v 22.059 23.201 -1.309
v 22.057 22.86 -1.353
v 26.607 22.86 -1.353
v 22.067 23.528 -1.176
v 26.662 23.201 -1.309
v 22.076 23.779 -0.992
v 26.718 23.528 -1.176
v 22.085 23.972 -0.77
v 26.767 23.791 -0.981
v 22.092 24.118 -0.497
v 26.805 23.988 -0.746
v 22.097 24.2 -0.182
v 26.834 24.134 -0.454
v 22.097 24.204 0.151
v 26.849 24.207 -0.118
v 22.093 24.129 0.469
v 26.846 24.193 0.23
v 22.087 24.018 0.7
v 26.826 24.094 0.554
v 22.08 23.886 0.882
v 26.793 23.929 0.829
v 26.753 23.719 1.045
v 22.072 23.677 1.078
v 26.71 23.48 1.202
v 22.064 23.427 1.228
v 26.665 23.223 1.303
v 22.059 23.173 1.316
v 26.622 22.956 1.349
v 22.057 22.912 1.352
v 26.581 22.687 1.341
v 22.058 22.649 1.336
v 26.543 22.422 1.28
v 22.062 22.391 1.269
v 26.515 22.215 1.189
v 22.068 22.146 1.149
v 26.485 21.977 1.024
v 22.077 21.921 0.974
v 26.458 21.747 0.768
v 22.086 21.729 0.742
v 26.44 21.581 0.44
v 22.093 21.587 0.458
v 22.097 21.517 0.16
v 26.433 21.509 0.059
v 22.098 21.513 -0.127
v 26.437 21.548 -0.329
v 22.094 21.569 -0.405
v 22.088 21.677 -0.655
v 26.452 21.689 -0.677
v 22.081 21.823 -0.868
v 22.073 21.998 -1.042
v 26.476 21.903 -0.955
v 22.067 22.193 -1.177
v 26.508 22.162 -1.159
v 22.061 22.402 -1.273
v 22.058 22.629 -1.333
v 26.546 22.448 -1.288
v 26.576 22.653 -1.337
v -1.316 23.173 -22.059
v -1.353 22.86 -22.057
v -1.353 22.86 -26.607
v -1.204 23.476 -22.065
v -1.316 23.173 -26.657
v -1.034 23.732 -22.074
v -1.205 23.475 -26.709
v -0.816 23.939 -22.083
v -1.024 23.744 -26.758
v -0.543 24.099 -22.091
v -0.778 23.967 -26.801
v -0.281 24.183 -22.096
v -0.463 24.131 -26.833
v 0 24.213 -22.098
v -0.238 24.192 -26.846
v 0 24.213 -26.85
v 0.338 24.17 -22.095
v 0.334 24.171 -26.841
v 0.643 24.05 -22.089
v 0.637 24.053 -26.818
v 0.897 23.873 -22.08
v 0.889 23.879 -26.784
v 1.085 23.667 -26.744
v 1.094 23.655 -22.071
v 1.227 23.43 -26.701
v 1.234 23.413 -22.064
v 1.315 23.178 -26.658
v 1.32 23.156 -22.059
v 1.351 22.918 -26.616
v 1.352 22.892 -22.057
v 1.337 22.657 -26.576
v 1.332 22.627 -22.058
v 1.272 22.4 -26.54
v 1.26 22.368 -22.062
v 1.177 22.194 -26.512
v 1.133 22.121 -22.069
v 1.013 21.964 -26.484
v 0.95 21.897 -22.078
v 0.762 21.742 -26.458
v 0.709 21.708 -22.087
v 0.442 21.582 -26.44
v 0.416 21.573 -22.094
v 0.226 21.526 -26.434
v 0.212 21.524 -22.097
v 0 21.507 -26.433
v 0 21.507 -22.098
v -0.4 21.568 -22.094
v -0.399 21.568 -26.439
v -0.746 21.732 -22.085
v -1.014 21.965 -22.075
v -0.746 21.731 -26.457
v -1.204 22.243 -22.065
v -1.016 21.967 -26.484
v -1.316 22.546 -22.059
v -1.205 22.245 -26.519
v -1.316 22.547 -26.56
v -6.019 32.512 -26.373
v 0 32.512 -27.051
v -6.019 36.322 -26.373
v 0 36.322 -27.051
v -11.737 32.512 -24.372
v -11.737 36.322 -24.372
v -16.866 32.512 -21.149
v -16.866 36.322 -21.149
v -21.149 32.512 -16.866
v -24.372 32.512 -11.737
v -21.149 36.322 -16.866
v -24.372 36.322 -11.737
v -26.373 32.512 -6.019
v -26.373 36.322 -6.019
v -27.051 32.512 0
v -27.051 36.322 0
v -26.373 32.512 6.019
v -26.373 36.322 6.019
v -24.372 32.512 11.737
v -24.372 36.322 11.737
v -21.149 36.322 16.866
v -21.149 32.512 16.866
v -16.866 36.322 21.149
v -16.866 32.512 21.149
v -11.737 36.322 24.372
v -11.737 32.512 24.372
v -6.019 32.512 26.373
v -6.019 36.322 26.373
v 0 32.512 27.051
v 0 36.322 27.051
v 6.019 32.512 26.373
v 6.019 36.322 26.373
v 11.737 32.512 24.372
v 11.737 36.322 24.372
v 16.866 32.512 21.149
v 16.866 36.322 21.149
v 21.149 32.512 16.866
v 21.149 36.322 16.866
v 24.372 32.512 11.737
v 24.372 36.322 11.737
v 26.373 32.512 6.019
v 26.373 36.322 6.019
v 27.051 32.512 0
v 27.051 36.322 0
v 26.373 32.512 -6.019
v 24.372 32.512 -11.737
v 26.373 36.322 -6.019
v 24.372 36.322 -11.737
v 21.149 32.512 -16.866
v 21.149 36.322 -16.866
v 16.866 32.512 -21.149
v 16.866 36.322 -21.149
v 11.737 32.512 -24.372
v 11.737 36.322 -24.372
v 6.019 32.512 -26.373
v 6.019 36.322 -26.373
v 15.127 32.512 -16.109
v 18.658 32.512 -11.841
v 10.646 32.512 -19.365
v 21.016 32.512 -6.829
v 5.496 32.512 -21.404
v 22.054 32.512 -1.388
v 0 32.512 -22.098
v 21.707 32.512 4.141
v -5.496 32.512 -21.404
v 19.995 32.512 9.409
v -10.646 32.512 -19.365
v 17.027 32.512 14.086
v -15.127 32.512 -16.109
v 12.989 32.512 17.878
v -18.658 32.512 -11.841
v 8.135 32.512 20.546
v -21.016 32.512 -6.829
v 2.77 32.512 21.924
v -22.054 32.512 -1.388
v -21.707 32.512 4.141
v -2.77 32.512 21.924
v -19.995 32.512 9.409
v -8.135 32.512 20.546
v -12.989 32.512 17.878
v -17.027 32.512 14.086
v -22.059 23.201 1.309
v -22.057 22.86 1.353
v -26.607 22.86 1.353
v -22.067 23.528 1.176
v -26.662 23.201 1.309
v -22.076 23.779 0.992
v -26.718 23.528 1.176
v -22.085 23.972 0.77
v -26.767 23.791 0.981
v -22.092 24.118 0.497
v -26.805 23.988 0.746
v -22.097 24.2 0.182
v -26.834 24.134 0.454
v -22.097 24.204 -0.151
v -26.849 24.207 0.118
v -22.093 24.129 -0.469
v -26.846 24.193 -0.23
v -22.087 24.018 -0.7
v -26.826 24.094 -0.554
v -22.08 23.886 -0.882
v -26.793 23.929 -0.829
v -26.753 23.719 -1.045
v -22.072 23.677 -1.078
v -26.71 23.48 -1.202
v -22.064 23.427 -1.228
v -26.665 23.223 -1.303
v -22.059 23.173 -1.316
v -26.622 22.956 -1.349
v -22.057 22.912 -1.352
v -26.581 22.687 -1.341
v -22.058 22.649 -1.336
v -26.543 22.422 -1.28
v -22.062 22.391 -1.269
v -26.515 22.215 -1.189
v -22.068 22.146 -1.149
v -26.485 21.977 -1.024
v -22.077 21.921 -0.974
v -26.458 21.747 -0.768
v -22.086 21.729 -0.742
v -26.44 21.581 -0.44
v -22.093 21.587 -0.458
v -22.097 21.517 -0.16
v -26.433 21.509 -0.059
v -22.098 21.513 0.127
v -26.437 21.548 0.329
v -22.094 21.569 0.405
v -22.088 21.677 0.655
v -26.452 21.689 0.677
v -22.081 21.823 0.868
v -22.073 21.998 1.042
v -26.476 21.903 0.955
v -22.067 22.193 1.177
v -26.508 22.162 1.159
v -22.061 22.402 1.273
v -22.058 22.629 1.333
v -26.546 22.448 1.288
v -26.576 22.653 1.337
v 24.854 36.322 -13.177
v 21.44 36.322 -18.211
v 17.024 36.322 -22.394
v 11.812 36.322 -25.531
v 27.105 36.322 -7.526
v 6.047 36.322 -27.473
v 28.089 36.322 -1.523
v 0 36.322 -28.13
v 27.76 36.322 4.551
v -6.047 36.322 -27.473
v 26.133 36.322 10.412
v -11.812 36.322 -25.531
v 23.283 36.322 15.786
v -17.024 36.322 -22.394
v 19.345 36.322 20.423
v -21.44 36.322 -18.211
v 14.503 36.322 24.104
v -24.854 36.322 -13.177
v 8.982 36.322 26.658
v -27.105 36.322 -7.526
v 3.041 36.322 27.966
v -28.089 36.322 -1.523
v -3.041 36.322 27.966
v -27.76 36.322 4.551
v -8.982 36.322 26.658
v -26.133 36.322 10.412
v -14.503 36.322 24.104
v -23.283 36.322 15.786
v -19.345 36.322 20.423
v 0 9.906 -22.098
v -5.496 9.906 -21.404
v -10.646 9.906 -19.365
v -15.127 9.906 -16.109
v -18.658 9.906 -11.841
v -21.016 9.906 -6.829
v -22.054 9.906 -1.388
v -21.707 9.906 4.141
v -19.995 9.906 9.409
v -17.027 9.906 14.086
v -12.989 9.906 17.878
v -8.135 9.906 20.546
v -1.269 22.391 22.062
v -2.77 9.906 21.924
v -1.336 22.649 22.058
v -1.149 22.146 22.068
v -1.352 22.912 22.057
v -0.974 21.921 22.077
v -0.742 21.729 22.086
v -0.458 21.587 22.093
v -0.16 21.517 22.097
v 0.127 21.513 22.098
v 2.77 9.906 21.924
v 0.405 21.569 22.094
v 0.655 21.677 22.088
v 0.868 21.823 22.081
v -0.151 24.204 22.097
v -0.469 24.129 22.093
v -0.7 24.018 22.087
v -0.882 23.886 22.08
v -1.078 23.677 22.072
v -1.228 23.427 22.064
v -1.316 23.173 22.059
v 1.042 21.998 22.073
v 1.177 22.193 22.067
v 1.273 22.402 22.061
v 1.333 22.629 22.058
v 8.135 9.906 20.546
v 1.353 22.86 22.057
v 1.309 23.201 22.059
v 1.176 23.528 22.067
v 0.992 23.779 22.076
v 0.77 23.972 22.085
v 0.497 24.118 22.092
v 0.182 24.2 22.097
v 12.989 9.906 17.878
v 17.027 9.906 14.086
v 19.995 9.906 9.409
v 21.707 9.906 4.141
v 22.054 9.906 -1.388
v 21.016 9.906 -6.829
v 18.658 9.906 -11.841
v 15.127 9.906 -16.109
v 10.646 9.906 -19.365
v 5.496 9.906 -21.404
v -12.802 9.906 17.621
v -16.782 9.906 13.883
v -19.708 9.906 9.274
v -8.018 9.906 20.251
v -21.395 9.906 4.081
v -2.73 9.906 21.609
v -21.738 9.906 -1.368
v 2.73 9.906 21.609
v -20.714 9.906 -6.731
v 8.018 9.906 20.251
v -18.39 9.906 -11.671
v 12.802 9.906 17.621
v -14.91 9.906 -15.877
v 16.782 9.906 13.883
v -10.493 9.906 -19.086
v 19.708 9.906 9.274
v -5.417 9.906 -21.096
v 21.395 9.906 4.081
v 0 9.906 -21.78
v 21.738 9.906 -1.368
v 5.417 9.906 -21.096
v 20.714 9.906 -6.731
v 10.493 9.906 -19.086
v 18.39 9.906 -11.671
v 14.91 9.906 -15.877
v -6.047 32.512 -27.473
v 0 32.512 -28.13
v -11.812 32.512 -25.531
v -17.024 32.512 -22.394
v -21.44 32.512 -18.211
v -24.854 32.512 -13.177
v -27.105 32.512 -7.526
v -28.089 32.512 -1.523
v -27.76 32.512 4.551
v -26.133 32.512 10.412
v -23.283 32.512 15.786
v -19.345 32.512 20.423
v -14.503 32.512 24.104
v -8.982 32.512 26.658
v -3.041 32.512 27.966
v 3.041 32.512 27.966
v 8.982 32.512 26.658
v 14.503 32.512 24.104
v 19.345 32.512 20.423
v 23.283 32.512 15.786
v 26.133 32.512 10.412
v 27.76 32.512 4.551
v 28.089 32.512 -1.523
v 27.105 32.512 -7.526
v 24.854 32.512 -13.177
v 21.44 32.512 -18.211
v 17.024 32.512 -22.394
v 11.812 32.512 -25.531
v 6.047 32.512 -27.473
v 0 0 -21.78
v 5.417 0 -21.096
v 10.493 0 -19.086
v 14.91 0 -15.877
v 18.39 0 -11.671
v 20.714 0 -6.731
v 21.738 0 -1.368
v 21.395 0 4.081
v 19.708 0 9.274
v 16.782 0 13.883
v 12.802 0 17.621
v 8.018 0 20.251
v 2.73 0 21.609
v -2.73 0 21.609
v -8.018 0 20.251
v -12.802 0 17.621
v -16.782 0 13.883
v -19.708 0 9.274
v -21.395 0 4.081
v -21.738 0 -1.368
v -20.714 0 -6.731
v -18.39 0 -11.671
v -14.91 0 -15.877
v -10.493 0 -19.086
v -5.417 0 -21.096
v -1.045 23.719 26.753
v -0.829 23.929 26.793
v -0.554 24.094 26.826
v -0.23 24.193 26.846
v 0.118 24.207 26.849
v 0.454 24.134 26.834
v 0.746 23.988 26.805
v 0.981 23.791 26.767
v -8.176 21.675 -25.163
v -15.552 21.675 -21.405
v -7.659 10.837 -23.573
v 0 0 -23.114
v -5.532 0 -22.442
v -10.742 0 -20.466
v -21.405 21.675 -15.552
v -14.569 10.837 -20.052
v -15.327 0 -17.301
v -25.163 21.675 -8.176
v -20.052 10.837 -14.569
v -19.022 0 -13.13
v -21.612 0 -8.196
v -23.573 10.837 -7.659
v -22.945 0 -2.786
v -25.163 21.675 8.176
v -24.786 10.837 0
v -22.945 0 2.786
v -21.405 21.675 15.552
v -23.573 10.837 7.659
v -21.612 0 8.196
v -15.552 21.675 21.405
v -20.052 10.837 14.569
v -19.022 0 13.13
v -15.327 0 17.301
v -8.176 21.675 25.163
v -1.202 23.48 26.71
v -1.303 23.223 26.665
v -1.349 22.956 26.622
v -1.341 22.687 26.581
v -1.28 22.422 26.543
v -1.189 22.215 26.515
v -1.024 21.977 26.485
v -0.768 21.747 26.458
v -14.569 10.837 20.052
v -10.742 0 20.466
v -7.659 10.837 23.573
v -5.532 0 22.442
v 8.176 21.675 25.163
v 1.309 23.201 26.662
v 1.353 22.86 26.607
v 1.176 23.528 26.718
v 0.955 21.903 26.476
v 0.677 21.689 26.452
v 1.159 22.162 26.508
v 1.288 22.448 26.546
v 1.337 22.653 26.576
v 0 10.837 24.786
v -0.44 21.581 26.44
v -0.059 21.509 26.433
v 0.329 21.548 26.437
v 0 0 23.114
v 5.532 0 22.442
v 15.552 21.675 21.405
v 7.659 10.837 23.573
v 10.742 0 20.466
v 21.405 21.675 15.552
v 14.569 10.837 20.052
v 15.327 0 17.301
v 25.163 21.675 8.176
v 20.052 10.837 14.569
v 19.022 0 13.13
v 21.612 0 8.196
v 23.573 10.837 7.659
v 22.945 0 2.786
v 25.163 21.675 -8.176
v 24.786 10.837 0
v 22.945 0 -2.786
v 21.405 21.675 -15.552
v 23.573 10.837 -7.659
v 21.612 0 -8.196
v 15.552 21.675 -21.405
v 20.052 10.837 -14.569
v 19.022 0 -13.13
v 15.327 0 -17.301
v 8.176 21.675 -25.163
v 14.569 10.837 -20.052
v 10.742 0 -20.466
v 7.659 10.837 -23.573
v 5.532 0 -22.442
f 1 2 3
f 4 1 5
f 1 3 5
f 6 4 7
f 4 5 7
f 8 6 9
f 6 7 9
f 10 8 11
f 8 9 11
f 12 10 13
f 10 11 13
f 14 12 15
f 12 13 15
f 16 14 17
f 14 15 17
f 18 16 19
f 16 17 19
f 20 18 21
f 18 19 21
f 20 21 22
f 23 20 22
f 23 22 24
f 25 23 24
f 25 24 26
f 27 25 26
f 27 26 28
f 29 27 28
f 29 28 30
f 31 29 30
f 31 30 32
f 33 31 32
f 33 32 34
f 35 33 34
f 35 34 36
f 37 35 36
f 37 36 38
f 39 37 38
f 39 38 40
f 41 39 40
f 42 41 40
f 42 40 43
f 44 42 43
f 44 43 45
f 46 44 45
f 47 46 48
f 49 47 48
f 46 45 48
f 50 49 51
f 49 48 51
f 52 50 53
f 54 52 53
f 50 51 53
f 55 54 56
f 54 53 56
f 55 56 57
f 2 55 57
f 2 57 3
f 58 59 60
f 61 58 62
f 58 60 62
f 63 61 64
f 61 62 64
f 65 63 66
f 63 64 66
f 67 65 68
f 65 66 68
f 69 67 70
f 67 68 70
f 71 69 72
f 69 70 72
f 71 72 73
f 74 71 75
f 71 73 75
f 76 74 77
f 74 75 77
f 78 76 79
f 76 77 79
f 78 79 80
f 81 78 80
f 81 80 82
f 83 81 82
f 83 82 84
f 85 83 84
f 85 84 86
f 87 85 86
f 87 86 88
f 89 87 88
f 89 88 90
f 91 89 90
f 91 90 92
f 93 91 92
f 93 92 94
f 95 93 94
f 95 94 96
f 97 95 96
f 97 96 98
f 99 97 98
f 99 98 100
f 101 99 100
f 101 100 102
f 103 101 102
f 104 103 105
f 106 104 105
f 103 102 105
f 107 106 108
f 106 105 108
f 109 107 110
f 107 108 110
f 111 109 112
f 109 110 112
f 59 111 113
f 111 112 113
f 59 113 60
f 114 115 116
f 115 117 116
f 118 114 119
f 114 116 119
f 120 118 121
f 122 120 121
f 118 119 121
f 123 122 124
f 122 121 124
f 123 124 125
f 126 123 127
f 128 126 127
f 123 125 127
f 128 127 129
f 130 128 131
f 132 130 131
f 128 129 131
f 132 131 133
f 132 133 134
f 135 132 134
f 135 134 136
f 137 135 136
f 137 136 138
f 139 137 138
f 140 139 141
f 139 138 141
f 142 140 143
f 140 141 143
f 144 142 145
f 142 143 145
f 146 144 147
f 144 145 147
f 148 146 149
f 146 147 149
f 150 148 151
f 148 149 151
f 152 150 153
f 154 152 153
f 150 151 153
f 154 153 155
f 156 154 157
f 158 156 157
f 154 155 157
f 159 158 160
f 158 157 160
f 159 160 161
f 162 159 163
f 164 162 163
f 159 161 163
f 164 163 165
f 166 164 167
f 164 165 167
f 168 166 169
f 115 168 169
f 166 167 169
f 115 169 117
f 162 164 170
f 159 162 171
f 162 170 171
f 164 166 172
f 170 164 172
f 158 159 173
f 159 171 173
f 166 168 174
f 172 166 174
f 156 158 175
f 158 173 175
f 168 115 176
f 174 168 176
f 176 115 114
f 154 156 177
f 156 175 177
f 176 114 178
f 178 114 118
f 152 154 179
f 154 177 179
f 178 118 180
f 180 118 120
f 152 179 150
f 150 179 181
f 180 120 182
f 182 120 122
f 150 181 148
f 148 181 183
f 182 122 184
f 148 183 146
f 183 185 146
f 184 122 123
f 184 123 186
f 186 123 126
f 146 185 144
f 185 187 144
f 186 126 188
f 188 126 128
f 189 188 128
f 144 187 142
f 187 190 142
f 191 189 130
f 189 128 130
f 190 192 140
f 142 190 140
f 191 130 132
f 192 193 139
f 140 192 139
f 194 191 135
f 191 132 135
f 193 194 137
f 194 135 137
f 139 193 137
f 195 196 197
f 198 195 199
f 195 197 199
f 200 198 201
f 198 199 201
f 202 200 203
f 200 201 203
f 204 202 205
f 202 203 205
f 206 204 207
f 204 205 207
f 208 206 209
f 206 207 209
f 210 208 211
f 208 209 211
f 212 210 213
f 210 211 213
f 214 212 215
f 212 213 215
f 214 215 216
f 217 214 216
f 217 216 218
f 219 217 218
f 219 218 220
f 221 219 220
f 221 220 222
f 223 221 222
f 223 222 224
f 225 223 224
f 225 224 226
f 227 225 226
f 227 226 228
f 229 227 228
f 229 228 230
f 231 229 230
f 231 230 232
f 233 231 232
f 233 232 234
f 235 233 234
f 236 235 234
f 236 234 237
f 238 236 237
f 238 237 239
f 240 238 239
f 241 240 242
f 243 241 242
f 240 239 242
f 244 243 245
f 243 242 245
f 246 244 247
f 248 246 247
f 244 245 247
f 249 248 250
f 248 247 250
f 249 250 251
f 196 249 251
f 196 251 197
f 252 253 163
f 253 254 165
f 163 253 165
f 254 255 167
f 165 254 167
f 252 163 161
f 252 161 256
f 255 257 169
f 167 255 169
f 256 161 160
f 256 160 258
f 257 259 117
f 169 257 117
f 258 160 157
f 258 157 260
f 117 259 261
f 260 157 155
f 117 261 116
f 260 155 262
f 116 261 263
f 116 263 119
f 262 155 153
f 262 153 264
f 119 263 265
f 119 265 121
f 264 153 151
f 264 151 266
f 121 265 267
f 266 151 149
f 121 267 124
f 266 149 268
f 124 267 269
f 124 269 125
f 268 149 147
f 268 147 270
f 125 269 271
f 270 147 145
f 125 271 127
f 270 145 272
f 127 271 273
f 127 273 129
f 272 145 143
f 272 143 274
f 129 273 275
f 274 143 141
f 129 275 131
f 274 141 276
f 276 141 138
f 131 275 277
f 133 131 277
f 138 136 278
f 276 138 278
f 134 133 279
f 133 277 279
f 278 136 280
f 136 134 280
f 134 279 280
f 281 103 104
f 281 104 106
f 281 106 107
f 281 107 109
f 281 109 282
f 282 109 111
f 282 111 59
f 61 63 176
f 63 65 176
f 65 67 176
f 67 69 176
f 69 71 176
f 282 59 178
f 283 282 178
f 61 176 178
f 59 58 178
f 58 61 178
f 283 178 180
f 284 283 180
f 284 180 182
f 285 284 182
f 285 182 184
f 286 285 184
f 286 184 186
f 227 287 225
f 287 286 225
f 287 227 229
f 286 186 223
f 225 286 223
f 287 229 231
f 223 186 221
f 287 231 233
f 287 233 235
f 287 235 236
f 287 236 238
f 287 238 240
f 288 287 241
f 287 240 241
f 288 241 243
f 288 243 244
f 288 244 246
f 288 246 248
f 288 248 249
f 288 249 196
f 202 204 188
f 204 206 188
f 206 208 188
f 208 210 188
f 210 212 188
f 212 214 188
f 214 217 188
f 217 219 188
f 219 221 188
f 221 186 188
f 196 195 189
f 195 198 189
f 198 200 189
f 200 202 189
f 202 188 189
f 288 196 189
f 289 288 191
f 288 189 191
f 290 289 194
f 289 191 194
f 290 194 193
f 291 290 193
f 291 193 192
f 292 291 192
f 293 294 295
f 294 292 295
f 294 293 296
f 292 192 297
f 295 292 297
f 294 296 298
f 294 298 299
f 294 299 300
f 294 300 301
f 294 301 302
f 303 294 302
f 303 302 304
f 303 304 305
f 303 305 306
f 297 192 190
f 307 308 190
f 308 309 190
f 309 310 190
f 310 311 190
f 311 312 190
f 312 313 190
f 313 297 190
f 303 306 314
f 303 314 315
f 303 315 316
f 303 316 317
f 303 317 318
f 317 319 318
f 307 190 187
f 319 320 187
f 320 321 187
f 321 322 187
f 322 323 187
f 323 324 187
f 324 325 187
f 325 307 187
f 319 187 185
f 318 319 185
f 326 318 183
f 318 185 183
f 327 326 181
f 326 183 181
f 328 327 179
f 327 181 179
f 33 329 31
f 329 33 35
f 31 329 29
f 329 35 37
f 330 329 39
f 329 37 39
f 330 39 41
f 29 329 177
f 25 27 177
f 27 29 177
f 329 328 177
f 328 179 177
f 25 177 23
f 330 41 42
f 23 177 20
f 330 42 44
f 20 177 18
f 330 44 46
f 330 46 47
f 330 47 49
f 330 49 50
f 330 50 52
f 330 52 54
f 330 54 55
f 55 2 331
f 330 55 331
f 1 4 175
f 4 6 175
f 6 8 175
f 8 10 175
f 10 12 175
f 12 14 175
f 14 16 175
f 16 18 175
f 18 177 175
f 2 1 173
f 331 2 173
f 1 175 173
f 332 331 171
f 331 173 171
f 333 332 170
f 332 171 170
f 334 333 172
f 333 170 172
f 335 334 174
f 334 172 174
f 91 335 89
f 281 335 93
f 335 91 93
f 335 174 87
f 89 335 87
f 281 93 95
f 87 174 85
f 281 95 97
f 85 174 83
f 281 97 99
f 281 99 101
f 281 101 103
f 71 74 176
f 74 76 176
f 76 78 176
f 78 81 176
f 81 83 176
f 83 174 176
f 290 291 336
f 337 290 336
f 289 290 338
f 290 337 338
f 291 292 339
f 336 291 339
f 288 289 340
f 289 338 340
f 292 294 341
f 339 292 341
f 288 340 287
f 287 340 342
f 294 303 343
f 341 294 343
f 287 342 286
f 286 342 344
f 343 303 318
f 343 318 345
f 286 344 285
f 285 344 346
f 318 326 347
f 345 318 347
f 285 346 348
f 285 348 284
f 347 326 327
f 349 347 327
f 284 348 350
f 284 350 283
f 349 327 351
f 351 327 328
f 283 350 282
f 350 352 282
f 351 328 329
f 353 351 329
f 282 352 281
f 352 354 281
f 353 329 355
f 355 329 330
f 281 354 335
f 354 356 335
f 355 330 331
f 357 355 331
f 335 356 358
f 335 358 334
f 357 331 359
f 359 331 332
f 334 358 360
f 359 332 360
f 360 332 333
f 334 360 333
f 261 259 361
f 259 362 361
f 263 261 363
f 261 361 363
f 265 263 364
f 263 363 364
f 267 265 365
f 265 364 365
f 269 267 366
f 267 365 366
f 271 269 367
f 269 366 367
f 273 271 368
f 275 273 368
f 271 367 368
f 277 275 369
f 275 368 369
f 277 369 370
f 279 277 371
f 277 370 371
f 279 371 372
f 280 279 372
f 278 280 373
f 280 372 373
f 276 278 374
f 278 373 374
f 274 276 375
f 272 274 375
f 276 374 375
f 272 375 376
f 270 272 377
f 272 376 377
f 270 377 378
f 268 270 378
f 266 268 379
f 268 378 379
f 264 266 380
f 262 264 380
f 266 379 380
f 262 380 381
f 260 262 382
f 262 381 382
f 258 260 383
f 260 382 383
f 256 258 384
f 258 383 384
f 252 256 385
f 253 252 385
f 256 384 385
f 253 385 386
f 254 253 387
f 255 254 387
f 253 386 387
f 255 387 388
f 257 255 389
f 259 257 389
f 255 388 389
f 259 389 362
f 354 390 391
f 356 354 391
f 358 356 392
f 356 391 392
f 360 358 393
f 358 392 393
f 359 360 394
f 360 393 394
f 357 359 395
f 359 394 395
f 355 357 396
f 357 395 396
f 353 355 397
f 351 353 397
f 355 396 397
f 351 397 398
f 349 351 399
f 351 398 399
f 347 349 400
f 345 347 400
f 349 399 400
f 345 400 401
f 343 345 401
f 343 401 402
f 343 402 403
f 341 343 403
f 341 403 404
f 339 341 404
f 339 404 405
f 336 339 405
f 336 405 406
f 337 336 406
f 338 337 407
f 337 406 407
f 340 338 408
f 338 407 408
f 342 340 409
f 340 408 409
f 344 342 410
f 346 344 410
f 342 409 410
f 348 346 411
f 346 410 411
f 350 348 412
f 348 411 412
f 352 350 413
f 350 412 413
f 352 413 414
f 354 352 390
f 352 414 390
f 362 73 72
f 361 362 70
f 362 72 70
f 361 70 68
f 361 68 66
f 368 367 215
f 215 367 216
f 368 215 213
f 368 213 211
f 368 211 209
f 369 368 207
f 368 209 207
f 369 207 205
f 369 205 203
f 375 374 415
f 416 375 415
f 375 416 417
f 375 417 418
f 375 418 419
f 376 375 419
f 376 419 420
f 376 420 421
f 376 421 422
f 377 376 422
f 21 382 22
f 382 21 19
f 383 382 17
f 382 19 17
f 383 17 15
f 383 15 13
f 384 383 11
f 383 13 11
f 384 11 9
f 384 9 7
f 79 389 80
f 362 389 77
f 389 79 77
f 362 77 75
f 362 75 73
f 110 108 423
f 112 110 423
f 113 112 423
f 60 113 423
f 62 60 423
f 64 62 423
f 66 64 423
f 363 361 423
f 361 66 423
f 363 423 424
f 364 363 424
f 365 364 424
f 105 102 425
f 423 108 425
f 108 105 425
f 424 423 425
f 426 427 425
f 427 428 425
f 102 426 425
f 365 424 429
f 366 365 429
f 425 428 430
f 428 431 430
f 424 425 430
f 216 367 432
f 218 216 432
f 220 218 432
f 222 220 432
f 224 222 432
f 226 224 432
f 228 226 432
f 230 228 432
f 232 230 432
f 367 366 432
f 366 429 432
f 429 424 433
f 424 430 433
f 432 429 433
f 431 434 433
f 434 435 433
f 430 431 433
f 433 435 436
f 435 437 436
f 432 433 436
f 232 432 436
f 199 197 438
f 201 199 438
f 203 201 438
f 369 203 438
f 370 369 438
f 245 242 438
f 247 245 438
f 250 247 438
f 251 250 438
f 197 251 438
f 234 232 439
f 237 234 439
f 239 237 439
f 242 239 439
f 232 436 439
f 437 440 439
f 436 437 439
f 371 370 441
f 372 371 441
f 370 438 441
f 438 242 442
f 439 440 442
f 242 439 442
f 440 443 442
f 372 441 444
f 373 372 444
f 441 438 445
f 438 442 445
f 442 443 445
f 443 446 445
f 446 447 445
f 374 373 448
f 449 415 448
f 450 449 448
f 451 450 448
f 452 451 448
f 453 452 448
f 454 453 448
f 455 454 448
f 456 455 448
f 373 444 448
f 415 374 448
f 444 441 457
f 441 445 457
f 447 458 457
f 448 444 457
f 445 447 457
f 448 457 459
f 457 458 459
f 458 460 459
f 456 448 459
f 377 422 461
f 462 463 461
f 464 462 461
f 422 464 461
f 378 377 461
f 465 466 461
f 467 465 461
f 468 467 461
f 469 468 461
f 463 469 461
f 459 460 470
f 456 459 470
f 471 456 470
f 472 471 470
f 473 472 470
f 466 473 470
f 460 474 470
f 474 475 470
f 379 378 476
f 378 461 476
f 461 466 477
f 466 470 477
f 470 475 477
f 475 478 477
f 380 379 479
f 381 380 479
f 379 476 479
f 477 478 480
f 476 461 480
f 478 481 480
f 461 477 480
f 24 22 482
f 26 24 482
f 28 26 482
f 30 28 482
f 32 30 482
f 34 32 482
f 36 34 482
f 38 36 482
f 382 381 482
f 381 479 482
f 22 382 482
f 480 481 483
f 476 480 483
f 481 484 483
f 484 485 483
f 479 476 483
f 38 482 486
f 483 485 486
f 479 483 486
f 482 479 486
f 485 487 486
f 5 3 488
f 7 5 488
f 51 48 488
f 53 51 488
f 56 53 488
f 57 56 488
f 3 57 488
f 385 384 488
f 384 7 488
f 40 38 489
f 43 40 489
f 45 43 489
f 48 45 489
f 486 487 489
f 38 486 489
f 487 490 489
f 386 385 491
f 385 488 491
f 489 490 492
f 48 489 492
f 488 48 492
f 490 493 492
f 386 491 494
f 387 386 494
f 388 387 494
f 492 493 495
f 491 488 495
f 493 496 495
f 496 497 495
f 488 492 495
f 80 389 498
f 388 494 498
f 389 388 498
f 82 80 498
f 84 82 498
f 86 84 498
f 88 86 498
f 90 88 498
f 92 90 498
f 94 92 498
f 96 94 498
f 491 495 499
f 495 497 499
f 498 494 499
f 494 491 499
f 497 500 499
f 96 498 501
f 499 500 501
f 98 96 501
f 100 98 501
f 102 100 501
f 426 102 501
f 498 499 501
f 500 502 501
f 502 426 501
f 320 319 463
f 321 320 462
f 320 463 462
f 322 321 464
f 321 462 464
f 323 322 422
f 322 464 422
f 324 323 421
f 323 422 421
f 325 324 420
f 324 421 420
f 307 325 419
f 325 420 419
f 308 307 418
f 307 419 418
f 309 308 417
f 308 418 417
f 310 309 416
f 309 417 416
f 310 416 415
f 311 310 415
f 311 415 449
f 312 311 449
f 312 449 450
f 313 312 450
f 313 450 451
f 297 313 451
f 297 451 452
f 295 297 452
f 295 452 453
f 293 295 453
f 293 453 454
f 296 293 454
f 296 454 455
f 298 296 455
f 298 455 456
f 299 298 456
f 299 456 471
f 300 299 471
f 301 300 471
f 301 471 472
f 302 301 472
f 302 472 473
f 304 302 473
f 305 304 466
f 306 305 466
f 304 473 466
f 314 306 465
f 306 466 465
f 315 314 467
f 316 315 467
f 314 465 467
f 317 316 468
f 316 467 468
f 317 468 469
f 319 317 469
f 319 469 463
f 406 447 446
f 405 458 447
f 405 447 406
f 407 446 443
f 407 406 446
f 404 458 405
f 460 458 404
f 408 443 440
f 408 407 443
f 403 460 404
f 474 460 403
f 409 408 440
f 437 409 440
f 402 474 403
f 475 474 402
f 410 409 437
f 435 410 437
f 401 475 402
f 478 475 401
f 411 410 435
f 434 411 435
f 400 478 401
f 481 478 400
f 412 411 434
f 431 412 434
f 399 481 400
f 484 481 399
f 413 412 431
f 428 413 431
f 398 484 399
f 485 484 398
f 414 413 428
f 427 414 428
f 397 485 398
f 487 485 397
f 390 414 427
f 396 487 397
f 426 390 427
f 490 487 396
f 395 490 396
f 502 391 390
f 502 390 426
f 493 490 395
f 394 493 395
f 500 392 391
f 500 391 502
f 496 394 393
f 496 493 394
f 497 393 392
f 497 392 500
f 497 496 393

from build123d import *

# Parameters (mm, degrees)
F_6_32_TAPPED_HOLE1_REACH  = 74.635
F_6_32_TAPPED_HOLE1_BORE_R = 1.35255
CIRPATTERN2_COUNT          = 4
SKETCH6_R                  = 22.098
SKETCH6_R_2                = 21.7805
BOSS_EXTRUDE1_DEPTH        = 9.906


with BuildPart() as part:
    # Sketch1 → Revolve1 (revolve)
    with BuildSketch(Plane.XY, mode=Mode.PRIVATE) as revolve1_sk:
        Polygon((28.1305, 36.322), (28.1305, 32.512), (23.114, 0), (22.098, 0), (22.098, 32.512), (27.051, 32.512), (27.051, 36.322), align=None)
    revolve(revolve1_sk.sketch.rotate(Axis((0, -2.3241, 0), (0, 1, 0)), 90), axis=Axis((0, -2.3241, 0), (0, 1, 0)))

    # #6-32 Tapped Hole1 bore → #6-32 Tapped Hole1 (cut, up to next)
    with BuildSketch(Plane.XY.offset(28.1305), mode=Mode.PRIVATE) as f_6_32_tapped_hole1_sk1:
        with Locations((0, 22.86)):
            Circle(F_6_32_TAPPED_HOLE1_BORE_R)
    f_6_32_tapped_hole1_tool1 = extrude(f_6_32_tapped_hole1_sk1.sketch, amount=-F_6_32_TAPPED_HOLE1_REACH, mode=Mode.PRIVATE) & part.part
    f_6_32_tapped_hole1 = f_6_32_tapped_hole1_tool1.solids().sort_by_distance((0, 22.86, 28.1305))[0]
    add(f_6_32_tapped_hole1, mode=Mode.SUBTRACT)

    # CirPattern2: #6-32 Tapped Hole1 ×4 about axis
    cirpattern2_axis = Axis((0, 0, 0), (0, 1, 0))
    for i in range(1, CIRPATTERN2_COUNT):
        add(f_6_32_tapped_hole1.rotate(cirpattern2_axis, i * 360 / CIRPATTERN2_COUNT), mode=Mode.SUBTRACT)

    # Sketch6 → Boss-Extrude1 (add)
    with BuildSketch(Plane.XZ):
        with Locations(Location((0, 0, 0), (0, 0, 270))):
            Circle(SKETCH6_R)
        with Locations(Location((0, 0, 0), (0, 0, 270))):
            Circle(SKETCH6_R_2, mode=Mode.SUBTRACT)
    extrude(amount=-BOSS_EXTRUDE1_DEPTH)


solid = part.part
